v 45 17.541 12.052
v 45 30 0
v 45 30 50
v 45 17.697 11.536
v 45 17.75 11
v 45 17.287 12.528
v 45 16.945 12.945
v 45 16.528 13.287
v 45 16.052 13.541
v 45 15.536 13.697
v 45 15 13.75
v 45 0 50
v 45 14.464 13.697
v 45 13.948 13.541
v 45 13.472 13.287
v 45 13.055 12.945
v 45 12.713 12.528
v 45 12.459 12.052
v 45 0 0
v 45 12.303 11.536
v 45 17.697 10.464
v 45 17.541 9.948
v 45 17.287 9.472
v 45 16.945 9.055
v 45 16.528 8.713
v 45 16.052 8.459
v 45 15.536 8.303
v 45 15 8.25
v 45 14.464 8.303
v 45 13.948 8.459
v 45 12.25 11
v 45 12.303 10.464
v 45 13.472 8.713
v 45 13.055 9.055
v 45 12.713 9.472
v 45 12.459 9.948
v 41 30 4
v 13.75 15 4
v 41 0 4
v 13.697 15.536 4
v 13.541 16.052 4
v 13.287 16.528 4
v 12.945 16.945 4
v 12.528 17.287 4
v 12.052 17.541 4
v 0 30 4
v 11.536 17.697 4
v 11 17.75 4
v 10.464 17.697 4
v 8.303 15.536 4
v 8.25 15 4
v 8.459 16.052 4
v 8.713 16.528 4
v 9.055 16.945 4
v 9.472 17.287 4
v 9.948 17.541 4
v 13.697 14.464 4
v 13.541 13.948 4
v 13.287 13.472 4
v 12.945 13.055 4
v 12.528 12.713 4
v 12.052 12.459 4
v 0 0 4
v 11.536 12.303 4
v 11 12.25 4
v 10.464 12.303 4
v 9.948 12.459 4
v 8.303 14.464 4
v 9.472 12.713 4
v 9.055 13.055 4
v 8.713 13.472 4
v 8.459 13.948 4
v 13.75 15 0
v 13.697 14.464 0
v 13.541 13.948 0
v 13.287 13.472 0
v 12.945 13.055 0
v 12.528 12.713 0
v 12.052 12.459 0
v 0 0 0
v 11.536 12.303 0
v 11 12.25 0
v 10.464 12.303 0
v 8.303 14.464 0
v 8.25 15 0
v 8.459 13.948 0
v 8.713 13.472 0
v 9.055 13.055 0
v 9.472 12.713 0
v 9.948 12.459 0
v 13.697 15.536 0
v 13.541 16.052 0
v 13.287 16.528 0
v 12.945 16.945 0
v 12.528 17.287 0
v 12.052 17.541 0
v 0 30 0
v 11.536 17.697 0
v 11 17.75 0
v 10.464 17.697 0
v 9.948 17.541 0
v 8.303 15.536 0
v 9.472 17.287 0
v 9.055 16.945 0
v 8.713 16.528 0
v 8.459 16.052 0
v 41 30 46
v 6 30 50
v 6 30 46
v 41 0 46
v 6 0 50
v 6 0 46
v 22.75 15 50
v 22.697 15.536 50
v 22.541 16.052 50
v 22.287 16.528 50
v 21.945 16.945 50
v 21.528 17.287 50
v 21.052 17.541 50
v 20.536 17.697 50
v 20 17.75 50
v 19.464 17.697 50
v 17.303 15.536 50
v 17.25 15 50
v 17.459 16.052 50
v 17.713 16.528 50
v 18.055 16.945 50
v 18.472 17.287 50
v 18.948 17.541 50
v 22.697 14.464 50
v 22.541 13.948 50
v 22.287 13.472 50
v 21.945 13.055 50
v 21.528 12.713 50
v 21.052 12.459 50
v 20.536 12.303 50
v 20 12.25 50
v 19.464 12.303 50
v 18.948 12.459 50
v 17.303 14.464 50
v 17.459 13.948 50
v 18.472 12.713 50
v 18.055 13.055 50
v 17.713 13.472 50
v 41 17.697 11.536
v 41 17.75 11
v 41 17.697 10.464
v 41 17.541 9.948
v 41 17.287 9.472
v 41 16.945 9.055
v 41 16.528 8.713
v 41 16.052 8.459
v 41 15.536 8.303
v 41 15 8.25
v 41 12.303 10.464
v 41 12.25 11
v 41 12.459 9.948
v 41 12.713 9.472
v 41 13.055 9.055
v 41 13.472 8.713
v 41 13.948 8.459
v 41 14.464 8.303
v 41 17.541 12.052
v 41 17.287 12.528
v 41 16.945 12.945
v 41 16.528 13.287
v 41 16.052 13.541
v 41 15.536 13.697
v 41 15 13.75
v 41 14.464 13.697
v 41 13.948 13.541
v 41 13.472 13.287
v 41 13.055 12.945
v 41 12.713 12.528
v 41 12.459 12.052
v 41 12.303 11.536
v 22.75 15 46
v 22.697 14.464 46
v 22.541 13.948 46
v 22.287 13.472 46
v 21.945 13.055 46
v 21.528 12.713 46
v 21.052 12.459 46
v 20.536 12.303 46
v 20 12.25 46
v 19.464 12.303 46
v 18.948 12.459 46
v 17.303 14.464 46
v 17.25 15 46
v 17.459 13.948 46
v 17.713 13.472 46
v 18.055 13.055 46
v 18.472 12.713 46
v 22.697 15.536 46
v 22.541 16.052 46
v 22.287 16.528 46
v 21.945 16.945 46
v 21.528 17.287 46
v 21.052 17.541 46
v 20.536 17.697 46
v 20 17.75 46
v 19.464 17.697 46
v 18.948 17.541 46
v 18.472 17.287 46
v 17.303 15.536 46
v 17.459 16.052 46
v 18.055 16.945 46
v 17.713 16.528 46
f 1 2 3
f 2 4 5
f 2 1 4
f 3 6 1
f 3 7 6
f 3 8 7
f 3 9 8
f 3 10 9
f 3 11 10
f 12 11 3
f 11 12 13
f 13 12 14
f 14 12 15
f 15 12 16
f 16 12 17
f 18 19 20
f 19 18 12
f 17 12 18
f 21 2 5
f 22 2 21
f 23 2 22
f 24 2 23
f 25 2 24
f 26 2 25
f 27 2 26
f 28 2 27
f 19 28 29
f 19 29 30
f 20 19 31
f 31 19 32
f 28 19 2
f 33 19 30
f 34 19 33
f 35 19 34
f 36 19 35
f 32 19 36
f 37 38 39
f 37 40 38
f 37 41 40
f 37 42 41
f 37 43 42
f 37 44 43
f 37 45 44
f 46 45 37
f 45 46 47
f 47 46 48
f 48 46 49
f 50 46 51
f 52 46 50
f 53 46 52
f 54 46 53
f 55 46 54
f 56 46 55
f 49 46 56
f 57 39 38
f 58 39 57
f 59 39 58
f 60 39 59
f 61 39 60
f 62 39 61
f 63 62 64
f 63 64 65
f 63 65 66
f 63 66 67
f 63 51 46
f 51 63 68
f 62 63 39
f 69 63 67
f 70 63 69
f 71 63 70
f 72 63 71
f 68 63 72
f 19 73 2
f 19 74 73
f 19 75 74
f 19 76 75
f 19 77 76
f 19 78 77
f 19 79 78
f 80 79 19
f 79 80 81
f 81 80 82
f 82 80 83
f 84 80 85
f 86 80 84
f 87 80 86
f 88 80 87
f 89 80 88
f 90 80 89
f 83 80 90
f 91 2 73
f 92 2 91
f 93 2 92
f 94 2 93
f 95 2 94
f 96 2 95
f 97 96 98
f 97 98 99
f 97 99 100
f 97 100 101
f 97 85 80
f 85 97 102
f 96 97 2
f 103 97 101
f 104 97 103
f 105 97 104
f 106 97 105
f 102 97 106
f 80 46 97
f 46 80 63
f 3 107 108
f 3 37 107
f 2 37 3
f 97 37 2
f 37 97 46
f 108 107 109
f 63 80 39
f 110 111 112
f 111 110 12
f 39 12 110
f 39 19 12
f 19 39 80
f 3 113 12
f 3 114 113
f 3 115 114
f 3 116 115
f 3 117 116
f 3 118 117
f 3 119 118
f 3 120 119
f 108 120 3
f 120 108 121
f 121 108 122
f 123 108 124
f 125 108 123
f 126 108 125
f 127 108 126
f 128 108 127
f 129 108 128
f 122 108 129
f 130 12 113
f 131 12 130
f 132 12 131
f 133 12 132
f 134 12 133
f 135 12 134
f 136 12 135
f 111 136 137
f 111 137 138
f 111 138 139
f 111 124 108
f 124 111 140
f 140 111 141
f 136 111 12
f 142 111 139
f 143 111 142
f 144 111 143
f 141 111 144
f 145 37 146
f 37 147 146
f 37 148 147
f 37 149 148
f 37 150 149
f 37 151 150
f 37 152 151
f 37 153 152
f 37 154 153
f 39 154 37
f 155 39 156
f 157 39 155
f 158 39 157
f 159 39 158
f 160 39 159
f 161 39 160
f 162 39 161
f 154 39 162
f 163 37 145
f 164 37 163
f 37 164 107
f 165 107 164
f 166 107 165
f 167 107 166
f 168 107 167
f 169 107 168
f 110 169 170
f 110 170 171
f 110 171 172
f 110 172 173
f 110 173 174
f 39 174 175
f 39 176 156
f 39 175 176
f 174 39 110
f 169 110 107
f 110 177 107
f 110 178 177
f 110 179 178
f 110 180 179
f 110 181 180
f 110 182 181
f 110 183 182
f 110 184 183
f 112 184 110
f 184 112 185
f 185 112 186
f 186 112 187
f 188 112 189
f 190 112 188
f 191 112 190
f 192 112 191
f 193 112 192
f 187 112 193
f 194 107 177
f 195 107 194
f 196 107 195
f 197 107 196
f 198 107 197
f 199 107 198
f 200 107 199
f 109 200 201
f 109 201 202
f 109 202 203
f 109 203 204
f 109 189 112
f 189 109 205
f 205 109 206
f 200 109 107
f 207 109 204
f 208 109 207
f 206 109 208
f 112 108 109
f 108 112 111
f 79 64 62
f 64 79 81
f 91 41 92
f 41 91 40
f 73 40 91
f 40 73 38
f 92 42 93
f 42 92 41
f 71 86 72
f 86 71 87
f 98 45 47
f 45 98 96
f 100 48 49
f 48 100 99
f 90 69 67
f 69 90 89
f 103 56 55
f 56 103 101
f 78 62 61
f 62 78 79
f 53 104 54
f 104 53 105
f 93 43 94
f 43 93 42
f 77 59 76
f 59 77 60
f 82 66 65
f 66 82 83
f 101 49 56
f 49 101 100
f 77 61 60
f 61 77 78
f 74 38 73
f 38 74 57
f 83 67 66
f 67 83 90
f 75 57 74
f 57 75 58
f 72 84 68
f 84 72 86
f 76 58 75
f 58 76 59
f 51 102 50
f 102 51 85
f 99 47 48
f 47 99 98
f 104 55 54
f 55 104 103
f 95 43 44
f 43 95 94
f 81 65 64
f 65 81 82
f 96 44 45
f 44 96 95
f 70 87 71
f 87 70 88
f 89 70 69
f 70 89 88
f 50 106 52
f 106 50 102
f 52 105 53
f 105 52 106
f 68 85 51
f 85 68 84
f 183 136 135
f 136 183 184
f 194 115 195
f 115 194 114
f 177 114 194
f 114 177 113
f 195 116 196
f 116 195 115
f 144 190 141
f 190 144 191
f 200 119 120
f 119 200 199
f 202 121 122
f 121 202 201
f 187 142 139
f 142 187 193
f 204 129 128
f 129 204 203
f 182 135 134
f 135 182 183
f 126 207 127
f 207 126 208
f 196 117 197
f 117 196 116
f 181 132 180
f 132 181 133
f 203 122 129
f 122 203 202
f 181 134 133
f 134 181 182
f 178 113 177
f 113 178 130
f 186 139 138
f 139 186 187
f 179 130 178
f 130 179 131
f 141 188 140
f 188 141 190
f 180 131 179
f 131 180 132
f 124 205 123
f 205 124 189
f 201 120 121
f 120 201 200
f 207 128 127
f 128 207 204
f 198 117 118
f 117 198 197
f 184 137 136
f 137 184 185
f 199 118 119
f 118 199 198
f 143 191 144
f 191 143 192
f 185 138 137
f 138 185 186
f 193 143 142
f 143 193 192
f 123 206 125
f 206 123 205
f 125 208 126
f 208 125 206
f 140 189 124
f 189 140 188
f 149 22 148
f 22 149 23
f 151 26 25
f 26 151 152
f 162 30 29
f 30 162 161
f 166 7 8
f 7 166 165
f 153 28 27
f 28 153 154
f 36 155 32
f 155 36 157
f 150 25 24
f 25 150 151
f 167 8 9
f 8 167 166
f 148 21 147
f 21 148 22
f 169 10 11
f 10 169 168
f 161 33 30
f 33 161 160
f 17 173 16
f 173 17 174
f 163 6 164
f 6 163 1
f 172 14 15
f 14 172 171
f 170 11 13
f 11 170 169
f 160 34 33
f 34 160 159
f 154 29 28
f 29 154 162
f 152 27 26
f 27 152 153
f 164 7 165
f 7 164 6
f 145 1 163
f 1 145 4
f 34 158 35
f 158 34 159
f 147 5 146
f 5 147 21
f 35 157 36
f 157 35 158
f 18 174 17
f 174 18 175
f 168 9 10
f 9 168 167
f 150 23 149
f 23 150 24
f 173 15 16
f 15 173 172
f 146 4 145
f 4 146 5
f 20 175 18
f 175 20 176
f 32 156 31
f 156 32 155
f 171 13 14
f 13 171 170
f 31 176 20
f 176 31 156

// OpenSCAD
$fn = 32;

// ----------------------------------------------------------------------
// Z-bracket: 45 x 30 x 50 mm
// ----------------------------------------------------------------------

// --- parameters (mm) ---
bottom_run = 45;          // lower foot length, X
top_run = 35;             // upper foot length, X
profile_w = 30;           // bracket width, Y
height = 50;              // overall rise, Z
mat_t = 4;                // plate thickness
hole_d = 5.5;             // clearance for M5

module hole_z(px, py, z0) {
  translate([px, py, z0 - 0.5]) cylinder(h = mat_t + 1, d = hole_d);
}
module hole_x(py, pz) {
  translate([-0.5, py, pz]) rotate([0, 90, 0]) cylinder(h = mat_t + 1, d = hole_d);
}

difference() {
  union() {
    cube([bottom_run, profile_w, mat_t]);
    /* web, overlapping the lower foot */
    translate([bottom_run - mat_t, 0, 0]) cube([mat_t, profile_w, height]);
    /* upper foot, sunk into the web */
    translate([bottom_run - mat_t - top_run, 0, height - mat_t]) cube([top_run + mat_t, profile_w, mat_t]);
  }
  hole_z(11, 15, 0);
  translate([bottom_run - mat_t - 21, 0, 0]) hole_z(0, 15, height - mat_t);
  translate([bottom_run - mat_t, 0, 0]) hole_x(15, 11);
}
